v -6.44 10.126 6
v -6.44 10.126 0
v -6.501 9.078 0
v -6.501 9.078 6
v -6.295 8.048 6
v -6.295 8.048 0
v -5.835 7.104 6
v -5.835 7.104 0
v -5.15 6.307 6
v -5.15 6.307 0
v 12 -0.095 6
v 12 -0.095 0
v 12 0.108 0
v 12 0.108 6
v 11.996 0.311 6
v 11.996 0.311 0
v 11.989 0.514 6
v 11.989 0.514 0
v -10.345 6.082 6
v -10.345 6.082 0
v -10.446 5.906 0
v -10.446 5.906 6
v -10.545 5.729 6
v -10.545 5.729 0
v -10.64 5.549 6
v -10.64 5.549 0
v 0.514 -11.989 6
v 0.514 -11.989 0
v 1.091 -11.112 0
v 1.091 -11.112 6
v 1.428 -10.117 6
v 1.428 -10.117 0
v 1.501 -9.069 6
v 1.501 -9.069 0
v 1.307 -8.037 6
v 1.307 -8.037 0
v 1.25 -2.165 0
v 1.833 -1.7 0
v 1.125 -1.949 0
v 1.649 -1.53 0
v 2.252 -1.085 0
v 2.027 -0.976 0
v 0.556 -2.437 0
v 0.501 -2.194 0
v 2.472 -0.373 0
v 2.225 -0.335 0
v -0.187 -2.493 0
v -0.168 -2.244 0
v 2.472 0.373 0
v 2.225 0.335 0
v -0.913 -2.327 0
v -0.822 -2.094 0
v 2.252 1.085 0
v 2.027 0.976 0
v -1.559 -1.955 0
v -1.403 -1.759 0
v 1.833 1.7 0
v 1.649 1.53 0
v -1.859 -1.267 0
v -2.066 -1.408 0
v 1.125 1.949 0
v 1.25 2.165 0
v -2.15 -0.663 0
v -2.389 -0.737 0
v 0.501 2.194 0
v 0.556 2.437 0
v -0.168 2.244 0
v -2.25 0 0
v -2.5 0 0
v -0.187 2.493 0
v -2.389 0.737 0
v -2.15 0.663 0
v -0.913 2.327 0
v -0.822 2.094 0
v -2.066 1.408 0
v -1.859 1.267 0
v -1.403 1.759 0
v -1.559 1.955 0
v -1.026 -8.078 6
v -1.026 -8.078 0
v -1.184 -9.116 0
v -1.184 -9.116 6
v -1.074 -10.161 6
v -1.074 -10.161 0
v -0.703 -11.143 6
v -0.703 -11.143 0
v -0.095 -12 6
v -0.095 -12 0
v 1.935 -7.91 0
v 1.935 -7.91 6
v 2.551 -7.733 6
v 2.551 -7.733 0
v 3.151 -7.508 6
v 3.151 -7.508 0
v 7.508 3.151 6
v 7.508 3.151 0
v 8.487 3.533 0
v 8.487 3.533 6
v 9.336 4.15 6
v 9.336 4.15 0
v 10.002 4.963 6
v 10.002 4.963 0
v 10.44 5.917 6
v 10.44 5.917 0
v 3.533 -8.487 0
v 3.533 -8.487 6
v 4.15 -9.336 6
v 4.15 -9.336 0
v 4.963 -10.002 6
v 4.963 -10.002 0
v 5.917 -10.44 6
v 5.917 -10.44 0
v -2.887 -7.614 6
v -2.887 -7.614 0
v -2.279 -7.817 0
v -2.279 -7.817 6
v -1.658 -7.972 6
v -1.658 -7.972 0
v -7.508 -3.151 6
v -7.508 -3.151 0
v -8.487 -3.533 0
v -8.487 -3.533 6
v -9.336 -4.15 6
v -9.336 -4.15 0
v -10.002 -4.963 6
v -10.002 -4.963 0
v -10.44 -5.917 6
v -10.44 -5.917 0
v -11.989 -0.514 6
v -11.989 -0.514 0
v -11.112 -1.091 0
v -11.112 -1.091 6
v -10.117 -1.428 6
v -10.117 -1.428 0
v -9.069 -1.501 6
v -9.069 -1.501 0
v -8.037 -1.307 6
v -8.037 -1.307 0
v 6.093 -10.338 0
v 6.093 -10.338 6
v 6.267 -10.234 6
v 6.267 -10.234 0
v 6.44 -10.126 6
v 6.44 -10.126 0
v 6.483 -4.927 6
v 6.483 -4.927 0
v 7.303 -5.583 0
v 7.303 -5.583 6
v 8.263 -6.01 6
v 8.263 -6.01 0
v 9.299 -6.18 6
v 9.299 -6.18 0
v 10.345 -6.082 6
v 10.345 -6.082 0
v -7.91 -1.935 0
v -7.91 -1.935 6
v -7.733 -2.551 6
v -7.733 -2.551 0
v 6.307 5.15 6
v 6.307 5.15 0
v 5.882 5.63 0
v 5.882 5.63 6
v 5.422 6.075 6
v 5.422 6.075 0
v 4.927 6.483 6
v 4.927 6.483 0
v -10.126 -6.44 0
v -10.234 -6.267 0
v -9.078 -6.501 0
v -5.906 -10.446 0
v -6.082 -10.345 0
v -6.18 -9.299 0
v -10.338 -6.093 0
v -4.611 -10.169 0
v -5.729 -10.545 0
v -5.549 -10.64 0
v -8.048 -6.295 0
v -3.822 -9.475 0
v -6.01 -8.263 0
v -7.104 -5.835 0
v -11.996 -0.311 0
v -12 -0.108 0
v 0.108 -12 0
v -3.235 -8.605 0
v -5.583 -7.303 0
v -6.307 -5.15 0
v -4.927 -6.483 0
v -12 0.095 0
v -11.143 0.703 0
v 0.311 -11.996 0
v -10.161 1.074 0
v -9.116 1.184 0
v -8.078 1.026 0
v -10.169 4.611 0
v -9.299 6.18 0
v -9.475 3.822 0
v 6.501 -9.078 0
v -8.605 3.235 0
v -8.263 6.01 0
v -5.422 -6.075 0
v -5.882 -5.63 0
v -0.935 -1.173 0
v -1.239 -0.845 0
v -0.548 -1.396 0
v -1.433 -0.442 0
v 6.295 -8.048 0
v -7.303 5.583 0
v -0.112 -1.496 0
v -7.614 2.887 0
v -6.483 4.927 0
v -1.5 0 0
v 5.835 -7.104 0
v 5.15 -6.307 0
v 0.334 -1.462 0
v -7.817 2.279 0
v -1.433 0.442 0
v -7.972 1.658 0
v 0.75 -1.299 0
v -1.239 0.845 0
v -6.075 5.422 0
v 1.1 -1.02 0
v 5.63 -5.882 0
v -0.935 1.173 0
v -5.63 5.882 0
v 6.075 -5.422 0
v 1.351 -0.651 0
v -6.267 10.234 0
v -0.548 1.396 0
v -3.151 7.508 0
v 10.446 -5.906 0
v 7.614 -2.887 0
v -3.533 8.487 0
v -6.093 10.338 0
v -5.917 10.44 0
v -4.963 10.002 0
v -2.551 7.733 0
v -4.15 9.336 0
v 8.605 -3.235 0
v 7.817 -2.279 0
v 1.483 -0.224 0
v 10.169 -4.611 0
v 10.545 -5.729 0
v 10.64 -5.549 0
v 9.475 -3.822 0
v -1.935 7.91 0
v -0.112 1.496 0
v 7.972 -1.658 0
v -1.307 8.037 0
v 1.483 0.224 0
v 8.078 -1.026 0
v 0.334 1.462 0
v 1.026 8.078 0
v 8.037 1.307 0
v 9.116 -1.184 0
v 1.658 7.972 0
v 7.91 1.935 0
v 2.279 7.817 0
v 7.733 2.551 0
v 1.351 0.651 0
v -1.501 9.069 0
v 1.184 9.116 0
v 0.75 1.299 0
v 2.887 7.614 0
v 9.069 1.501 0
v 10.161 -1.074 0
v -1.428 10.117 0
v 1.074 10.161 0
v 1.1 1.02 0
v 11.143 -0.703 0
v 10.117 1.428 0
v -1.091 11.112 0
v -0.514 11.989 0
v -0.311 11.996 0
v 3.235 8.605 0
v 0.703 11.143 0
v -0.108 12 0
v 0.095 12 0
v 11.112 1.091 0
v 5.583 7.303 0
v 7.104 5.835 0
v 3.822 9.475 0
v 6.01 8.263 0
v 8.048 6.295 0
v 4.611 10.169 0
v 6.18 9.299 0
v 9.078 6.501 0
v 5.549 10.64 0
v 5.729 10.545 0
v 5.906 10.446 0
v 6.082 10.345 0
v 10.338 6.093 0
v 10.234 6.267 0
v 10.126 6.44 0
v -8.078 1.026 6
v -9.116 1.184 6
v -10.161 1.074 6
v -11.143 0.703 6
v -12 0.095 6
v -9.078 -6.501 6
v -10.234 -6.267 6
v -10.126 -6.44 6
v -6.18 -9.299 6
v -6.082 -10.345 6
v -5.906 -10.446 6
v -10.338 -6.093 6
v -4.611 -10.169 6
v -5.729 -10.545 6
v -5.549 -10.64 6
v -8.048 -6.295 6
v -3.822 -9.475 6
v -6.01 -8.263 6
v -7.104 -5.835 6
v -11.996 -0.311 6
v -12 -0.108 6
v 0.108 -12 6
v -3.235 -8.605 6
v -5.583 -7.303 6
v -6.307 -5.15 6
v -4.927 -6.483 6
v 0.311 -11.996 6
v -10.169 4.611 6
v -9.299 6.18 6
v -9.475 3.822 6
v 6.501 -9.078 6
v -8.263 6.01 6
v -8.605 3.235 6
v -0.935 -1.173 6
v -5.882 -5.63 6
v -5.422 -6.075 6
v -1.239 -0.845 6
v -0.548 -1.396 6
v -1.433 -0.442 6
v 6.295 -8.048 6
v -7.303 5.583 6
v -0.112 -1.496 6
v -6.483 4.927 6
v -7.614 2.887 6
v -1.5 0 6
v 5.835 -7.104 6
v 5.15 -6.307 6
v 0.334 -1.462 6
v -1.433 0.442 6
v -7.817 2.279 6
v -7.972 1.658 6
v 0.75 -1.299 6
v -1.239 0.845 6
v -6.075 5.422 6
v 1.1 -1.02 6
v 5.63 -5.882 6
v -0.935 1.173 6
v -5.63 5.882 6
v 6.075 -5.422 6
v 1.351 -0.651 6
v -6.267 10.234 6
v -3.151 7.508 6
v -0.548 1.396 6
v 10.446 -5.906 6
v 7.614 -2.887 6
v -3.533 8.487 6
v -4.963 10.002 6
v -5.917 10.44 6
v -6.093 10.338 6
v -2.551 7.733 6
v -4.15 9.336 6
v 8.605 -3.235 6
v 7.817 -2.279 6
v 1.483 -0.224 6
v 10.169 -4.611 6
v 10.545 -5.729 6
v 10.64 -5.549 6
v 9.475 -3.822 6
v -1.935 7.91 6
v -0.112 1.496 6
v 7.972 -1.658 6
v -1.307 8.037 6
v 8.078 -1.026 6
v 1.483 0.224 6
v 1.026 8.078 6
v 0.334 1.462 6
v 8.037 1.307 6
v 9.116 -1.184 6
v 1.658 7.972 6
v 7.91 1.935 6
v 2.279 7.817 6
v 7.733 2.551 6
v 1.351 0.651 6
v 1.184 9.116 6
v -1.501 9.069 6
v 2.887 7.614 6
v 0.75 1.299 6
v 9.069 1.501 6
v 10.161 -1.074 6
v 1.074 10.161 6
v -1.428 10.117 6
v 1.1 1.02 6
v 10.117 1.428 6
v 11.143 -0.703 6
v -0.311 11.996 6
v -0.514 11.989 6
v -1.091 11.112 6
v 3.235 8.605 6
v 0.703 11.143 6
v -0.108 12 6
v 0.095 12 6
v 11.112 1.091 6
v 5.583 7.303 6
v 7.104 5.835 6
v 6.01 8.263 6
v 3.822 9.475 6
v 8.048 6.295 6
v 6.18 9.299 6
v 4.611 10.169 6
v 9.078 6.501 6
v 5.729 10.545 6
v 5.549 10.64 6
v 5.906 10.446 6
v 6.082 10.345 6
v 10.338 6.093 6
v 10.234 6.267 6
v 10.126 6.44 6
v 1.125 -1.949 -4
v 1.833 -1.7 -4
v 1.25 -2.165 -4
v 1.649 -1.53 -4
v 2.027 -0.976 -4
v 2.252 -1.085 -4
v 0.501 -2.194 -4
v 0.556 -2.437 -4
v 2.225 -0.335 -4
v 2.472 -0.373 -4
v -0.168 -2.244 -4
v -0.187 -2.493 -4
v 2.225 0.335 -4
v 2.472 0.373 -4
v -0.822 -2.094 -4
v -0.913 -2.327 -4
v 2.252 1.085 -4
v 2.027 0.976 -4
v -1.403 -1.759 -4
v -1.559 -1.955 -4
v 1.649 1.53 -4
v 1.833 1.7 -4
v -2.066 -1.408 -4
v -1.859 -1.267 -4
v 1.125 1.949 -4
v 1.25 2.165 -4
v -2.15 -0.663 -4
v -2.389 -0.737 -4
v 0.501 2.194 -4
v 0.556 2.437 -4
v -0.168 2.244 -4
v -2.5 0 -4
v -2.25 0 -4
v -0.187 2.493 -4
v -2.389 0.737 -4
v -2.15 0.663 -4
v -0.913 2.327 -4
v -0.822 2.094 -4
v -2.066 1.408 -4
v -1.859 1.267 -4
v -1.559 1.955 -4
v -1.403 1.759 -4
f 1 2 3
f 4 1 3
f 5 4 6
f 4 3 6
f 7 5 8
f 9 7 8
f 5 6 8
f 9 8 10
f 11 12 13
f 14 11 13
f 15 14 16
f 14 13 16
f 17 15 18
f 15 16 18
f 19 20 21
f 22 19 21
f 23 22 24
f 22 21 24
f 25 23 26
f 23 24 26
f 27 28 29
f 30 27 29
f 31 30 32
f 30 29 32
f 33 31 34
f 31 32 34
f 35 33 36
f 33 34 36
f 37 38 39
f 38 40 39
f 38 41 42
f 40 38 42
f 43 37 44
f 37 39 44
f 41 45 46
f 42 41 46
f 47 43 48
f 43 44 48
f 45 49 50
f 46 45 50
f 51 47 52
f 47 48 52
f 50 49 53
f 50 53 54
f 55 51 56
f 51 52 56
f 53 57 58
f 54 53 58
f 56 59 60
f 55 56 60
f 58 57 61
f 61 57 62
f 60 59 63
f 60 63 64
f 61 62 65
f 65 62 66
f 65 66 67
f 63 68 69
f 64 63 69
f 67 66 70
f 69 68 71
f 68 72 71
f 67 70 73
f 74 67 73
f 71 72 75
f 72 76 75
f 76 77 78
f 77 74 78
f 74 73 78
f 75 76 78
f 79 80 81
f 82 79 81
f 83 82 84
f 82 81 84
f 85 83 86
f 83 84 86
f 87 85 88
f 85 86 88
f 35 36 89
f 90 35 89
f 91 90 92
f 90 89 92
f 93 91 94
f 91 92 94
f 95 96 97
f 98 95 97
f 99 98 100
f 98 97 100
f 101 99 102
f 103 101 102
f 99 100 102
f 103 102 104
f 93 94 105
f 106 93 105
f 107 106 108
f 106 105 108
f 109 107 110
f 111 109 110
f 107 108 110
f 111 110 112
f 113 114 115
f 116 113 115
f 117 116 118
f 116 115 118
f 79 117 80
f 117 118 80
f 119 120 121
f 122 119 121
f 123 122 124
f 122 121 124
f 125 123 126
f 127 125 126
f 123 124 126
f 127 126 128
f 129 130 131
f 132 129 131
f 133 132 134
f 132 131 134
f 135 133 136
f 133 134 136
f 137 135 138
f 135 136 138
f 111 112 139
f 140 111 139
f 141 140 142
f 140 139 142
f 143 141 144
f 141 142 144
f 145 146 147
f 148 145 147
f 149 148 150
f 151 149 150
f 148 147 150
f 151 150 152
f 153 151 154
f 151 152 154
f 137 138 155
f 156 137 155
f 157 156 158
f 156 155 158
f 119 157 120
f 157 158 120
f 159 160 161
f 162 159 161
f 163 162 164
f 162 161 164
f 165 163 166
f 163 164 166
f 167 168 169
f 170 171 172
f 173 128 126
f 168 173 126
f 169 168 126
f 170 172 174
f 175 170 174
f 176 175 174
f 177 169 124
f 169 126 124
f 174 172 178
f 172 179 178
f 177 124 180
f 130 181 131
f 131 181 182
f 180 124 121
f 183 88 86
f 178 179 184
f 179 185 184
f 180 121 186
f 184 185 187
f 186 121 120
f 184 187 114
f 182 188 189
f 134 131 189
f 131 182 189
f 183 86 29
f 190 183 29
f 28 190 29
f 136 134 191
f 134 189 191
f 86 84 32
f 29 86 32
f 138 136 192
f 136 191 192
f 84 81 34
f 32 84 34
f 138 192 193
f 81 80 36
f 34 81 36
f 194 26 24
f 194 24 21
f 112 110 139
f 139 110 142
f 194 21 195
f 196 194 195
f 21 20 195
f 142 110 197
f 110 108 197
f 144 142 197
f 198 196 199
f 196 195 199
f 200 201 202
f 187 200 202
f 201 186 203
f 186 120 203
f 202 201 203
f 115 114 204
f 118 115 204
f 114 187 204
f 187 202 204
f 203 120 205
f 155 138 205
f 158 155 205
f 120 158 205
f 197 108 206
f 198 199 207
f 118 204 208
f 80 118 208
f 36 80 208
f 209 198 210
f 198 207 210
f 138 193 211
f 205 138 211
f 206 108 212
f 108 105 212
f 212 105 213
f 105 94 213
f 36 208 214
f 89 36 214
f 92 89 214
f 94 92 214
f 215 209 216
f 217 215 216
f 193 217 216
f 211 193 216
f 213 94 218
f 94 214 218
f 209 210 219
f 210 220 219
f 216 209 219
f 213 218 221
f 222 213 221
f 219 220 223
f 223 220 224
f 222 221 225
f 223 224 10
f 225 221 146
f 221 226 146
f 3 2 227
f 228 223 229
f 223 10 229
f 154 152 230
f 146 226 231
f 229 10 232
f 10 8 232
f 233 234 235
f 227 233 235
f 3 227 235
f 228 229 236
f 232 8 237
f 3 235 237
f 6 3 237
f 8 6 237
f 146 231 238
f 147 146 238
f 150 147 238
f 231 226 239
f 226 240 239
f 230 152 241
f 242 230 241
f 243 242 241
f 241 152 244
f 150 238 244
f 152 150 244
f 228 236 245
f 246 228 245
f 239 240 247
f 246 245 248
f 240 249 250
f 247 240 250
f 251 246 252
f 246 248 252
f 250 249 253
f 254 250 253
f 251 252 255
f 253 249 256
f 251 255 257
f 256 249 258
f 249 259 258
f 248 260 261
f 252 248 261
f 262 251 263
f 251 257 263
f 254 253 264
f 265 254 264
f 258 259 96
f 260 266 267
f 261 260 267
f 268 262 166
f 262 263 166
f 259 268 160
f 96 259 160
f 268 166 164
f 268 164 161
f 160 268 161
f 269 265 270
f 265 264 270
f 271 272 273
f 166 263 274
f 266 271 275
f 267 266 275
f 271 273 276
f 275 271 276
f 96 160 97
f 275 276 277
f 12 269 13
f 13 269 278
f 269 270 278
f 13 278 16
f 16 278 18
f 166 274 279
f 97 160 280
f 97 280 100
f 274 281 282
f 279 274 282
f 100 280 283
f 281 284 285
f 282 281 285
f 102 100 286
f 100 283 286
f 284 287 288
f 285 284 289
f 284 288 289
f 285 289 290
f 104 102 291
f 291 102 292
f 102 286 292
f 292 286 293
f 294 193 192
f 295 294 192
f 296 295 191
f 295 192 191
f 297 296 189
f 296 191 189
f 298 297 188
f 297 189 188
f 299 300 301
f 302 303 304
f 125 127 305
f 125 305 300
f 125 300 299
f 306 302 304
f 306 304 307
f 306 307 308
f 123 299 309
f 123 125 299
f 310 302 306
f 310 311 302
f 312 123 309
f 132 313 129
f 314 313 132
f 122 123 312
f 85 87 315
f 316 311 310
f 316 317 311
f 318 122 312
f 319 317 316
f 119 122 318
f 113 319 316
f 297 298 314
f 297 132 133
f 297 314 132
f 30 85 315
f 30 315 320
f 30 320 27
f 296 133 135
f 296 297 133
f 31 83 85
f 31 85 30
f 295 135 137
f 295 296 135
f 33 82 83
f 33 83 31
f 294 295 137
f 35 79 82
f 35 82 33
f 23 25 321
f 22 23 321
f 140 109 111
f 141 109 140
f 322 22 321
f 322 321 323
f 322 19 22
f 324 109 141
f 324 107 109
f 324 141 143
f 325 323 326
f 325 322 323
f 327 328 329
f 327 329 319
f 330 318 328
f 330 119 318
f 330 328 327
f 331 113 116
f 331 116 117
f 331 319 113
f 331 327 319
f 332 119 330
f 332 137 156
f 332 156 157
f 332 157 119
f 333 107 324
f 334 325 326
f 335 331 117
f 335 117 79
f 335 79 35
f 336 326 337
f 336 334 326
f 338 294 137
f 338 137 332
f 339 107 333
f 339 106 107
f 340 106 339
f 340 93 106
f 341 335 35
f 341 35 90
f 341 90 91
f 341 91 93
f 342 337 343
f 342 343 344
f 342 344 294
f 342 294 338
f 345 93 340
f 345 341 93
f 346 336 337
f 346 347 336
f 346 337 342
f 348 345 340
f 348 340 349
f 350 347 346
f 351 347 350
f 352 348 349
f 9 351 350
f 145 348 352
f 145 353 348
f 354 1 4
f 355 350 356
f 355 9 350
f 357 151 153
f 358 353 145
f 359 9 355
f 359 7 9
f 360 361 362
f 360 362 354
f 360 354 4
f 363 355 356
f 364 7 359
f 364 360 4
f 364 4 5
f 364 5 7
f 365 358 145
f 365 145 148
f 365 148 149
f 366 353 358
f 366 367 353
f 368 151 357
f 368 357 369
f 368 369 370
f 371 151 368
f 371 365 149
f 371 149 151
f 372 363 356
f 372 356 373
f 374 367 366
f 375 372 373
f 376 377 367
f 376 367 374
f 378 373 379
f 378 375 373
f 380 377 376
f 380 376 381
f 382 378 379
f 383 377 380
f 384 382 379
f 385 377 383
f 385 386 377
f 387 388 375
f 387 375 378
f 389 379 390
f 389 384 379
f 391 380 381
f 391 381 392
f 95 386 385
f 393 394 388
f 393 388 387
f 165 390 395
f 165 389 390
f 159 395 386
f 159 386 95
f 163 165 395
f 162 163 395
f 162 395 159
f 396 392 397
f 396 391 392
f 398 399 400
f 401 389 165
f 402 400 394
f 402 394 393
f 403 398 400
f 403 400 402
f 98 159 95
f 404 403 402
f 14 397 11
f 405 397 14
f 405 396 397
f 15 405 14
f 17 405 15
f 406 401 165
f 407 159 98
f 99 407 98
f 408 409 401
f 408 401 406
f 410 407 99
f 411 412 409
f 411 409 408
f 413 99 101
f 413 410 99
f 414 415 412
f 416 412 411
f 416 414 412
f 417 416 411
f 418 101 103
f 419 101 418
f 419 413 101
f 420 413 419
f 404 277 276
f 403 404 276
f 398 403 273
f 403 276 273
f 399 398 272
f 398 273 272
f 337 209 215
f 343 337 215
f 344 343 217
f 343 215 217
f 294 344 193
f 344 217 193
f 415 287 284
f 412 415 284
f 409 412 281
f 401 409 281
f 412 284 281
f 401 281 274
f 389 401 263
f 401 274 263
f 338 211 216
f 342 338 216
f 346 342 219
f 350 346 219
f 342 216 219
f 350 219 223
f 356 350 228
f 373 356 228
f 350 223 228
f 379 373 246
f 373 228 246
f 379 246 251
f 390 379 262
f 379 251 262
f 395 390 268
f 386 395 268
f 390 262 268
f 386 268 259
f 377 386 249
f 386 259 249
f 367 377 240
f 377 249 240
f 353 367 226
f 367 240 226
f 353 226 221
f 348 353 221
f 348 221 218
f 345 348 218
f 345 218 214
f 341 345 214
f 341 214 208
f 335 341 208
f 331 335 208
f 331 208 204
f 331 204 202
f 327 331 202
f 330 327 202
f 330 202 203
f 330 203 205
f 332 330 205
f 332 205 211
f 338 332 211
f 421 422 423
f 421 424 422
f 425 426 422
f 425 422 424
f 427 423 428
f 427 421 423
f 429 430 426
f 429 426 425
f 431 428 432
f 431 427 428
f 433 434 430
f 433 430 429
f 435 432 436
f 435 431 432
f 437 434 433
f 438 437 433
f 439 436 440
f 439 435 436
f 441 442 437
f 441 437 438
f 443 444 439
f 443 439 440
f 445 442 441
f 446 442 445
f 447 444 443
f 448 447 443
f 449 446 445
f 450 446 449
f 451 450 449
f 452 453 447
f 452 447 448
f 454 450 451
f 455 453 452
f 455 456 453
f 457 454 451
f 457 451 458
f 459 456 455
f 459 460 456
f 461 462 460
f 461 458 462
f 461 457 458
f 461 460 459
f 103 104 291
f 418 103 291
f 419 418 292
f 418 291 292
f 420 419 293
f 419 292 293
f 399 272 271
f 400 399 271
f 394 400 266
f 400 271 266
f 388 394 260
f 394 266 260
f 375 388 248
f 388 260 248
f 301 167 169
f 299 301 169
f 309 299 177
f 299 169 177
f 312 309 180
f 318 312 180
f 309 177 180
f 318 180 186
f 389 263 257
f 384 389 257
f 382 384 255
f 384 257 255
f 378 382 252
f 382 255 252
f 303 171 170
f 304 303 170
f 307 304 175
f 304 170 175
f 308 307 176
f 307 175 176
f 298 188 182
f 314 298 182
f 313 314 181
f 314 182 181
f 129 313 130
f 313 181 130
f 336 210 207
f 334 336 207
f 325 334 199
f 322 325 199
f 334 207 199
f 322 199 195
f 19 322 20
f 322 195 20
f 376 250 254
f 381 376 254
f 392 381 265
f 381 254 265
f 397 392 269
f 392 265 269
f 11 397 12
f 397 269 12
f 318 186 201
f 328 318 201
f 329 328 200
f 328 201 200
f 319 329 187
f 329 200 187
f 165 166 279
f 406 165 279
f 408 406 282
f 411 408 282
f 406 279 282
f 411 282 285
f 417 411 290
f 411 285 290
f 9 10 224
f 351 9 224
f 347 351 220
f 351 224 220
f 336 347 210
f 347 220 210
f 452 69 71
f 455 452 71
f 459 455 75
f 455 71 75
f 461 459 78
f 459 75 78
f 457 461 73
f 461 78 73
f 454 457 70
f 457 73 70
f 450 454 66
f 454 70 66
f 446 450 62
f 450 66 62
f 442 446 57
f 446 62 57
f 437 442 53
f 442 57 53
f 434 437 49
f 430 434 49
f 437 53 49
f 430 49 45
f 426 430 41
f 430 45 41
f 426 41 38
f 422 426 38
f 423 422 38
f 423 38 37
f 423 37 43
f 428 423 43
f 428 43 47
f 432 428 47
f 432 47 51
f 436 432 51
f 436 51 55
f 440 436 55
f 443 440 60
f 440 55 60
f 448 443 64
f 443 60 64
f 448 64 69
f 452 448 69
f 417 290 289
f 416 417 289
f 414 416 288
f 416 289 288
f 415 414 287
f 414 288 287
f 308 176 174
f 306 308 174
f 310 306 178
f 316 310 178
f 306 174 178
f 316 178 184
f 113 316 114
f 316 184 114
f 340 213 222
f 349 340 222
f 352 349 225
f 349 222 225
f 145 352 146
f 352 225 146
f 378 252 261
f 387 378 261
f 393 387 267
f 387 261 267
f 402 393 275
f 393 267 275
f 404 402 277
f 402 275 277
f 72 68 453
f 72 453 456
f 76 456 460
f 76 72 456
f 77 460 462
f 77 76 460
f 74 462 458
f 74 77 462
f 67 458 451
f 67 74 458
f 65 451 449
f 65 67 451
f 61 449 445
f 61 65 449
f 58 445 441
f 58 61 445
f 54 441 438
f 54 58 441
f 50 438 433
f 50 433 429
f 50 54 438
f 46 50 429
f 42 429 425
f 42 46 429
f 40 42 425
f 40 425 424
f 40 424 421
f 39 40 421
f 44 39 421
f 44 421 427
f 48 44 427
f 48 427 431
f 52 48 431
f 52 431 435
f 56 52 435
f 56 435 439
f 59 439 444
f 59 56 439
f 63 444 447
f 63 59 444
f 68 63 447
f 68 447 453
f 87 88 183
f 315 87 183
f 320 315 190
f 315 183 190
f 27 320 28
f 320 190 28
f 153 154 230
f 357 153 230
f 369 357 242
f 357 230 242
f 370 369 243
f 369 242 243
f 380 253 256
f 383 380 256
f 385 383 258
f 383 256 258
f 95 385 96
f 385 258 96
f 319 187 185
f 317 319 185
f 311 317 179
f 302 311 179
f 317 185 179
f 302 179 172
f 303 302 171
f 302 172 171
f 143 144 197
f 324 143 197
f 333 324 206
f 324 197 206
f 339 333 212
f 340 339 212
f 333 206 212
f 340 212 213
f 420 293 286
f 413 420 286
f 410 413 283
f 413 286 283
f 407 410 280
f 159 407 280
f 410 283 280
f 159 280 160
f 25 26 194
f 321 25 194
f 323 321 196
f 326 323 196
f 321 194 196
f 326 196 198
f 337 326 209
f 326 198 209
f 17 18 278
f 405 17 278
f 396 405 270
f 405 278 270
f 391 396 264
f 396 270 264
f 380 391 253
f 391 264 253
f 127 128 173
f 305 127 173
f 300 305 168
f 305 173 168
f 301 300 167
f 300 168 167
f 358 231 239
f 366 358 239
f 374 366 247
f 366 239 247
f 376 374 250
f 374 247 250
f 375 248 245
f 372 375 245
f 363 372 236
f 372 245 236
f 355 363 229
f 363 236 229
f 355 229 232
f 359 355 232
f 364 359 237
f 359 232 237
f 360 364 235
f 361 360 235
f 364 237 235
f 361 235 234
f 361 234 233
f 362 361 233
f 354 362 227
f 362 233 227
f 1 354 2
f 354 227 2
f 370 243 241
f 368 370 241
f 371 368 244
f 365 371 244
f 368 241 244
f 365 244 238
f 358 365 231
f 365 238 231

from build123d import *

# Parameters (mm, degrees)
BOSS_EXTRUDE1_DEPTH = 6
SKETCH3_R           = 1.5
CUT_EXTRUDE1_DEPTH  = 19.000399801
SKETCH4_R           = 2.5
SKETCH4_R_2         = 2.25
BOSS_EXTRUDE2_DEPTH = 4


with BuildPart() as part:
    # Sketch1 → Boss-Extrude1 (new body)
    with BuildSketch(Plane.XY):
        with BuildLine():
            ThreePointArc((-10.640037181, 5.549486938), (-9.475370008, 3.822122054), (-7.61385122, 2.886714725))
            ThreePointArc((-7.61385122, 2.886714725), (-7.90084423, 1.969901713), (-8.07786208, 1.025668813))
            ThreePointArc((-8.07786208, 1.025668813), (-10.160632754, 1.073683298), (-11.999921522, 0.095288749))
            ThreePointArc((-11.999921522, 0.095288749), (-11.998472146, -0.20943411), (-11.989285965, -0.514021924))
            ThreePointArc((-11.989285965, -0.514021924), (-10.116972164, -1.427630209), (-8.03714594, -1.306957324))
            ThreePointArc((-8.03714594, -1.306957324), (-7.827282671, -2.244437189), (-7.508468176, -3.150675792))
            ThreePointArc((-7.508468176, -3.150675792), (-9.336207732, -4.150479365), (-10.439881257, -5.917438283))
            ThreePointArc((-10.439881257, -5.917438283), (-10.28626463, -6.180611333), (-10.126015257, -6.439799027))
            ThreePointArc((-10.126015257, -6.439799027), (-8.047739799, -6.29485011), (-6.306893895, -5.150431214))
            ThreePointArc((-6.306893895, -5.150431214), (-5.656407041, -5.857380958), (-4.927186288, -6.482799363))
            ThreePointArc((-4.927186288, -6.482799363), (-6.010153389, -8.262524434), (-6.082483239, -10.344592507))
            ThreePointArc((-6.082483239, -10.344592507), (-5.817860813, -10.49569874), (-5.549486938, -10.640037181))
            ThreePointArc((-5.549486938, -10.640037181), (-3.822122054, -9.475370008), (-2.886714725, -7.61385122))
            ThreePointArc((-2.886714725, -7.61385122), (-1.969901713, -7.90084423), (-1.025668813, -8.07786208))
            ThreePointArc((-1.025668813, -8.07786208), (-1.073683298, -10.160632754), (-0.095288749, -11.999921522))
            ThreePointArc((-0.095288749, -11.999921522), (0.20943411, -11.998472146), (0.514021924, -11.989285965))
            ThreePointArc((0.514021924, -11.989285965), (1.427630209, -10.116972164), (1.306957324, -8.03714594))
            ThreePointArc((1.306957324, -8.03714594), (2.244437189, -7.827282671), (3.150675792, -7.508468176))
            ThreePointArc((3.150675792, -7.508468176), (4.150479365, -9.336207732), (5.917438283, -10.439881257))
            ThreePointArc((5.917438283, -10.439881257), (6.180611333, -10.28626463), (6.439799027, -10.126015257))
            ThreePointArc((6.439799027, -10.126015257), (6.29485011, -8.047739799), (5.150431214, -6.306893895))
            ThreePointArc((5.150431214, -6.306893895), (5.857380958, -5.656407041), (6.482799363, -4.927186288))
            ThreePointArc((6.482799363, -4.927186288), (8.262524434, -6.010153389), (10.344592507, -6.082483239))
            ThreePointArc((10.344592507, -6.082483239), (10.49569874, -5.817860813), (10.640037181, -5.549486938))
            ThreePointArc((10.640037181, -5.549486938), (9.475370008, -3.822122054), (7.61385122, -2.886714725))
            ThreePointArc((7.61385122, -2.886714725), (7.90084423, -1.969901713), (8.07786208, -1.025668813))
            ThreePointArc((8.07786208, -1.025668813), (10.160632754, -1.073683298), (11.999921522, -0.095288749))
            ThreePointArc((11.999921522, -0.095288749), (11.998472146, 0.20943411), (11.989285965, 0.514021924))
            ThreePointArc((11.989285965, 0.514021924), (10.116972164, 1.427630209), (8.03714594, 1.306957324))
            ThreePointArc((8.03714594, 1.306957324), (7.827282671, 2.244437189), (7.508468176, 3.150675792))
            ThreePointArc((7.508468176, 3.150675792), (9.336207732, 4.150479365), (10.439881257, 5.917438283))
            ThreePointArc((10.439881257, 5.917438283), (10.28626463, 6.180611333), (10.126015257, 6.439799027))
            ThreePointArc((10.126015257, 6.439799027), (8.047739799, 6.29485011), (6.306893895, 5.150431214))
            ThreePointArc((6.306893895, 5.150431214), (5.656407041, 5.857380958), (4.927186288, 6.482799363))
            ThreePointArc((4.927186288, 6.482799363), (6.010153389, 8.262524434), (6.082483239, 10.344592507))
            ThreePointArc((6.082483239, 10.344592507), (5.817860813, 10.49569874), (5.549486938, 10.640037181))
            ThreePointArc((5.549486938, 10.640037181), (3.822122054, 9.475370008), (2.886714725, 7.61385122))
            ThreePointArc((2.886714725, 7.61385122), (1.969901713, 7.90084423), (1.025668813, 8.07786208))
            ThreePointArc((1.025668813, 8.07786208), (1.073683298, 10.160632754), (0.095288749, 11.999921522))
            ThreePointArc((0.095288749, 11.999921522), (-0.20943411, 11.998472146), (-0.514021924, 11.989285965))
            ThreePointArc((-0.514021924, 11.989285965), (-1.427630209, 10.116972164), (-1.306957324, 8.03714594))
            ThreePointArc((-1.306957324, 8.03714594), (-2.244437189, 7.827282671), (-3.150675792, 7.508468176))
            ThreePointArc((-3.150675792, 7.508468176), (-4.150479365, 9.336207732), (-5.917438283, 10.439881257))
            ThreePointArc((-5.917438283, 10.439881257), (-6.180611333, 10.28626463), (-6.439799027, 10.126015257))
            ThreePointArc((-6.439799027, 10.126015257), (-6.29485011, 8.047739799), (-5.150431214, 6.306893895))
            ThreePointArc((-5.150431214, 6.306893895), (-5.857380958, 5.656407041), (-6.482799363, 4.927186288))
            ThreePointArc((-6.482799363, 4.927186288), (-8.262524434, 6.010153389), (-10.344592507, 6.082483239))
            ThreePointArc((-10.344592507, 6.082483239), (-10.49569874, 5.817860813), (-10.640037181, 5.549486938))
        make_face()
    extrude(amount=BOSS_EXTRUDE1_DEPTH)

    # Sketch3 → Cut-Extrude1 (cut, through all)
    with BuildSketch(Plane(origin=(0, 0, 0), x_dir=(-1, 0, 0), z_dir=(0, 0, -1))):
        Circle(SKETCH3_R)
    extrude(amount=-CUT_EXTRUDE1_DEPTH, mode=Mode.SUBTRACT)


with BuildPart() as body_2:
    # Sketch4 → Boss-Extrude2 (new body)
    with BuildSketch(Plane(origin=(0, 0, 0), x_dir=(-1, 0, 0), z_dir=(0, 0, -1))):
        Circle(SKETCH4_R)
        Circle(SKETCH4_R_2, mode=Mode.SUBTRACT)
    extrude(amount=BOSS_EXTRUDE2_DEPTH)


solid = Compound([part.part, body_2.part])
